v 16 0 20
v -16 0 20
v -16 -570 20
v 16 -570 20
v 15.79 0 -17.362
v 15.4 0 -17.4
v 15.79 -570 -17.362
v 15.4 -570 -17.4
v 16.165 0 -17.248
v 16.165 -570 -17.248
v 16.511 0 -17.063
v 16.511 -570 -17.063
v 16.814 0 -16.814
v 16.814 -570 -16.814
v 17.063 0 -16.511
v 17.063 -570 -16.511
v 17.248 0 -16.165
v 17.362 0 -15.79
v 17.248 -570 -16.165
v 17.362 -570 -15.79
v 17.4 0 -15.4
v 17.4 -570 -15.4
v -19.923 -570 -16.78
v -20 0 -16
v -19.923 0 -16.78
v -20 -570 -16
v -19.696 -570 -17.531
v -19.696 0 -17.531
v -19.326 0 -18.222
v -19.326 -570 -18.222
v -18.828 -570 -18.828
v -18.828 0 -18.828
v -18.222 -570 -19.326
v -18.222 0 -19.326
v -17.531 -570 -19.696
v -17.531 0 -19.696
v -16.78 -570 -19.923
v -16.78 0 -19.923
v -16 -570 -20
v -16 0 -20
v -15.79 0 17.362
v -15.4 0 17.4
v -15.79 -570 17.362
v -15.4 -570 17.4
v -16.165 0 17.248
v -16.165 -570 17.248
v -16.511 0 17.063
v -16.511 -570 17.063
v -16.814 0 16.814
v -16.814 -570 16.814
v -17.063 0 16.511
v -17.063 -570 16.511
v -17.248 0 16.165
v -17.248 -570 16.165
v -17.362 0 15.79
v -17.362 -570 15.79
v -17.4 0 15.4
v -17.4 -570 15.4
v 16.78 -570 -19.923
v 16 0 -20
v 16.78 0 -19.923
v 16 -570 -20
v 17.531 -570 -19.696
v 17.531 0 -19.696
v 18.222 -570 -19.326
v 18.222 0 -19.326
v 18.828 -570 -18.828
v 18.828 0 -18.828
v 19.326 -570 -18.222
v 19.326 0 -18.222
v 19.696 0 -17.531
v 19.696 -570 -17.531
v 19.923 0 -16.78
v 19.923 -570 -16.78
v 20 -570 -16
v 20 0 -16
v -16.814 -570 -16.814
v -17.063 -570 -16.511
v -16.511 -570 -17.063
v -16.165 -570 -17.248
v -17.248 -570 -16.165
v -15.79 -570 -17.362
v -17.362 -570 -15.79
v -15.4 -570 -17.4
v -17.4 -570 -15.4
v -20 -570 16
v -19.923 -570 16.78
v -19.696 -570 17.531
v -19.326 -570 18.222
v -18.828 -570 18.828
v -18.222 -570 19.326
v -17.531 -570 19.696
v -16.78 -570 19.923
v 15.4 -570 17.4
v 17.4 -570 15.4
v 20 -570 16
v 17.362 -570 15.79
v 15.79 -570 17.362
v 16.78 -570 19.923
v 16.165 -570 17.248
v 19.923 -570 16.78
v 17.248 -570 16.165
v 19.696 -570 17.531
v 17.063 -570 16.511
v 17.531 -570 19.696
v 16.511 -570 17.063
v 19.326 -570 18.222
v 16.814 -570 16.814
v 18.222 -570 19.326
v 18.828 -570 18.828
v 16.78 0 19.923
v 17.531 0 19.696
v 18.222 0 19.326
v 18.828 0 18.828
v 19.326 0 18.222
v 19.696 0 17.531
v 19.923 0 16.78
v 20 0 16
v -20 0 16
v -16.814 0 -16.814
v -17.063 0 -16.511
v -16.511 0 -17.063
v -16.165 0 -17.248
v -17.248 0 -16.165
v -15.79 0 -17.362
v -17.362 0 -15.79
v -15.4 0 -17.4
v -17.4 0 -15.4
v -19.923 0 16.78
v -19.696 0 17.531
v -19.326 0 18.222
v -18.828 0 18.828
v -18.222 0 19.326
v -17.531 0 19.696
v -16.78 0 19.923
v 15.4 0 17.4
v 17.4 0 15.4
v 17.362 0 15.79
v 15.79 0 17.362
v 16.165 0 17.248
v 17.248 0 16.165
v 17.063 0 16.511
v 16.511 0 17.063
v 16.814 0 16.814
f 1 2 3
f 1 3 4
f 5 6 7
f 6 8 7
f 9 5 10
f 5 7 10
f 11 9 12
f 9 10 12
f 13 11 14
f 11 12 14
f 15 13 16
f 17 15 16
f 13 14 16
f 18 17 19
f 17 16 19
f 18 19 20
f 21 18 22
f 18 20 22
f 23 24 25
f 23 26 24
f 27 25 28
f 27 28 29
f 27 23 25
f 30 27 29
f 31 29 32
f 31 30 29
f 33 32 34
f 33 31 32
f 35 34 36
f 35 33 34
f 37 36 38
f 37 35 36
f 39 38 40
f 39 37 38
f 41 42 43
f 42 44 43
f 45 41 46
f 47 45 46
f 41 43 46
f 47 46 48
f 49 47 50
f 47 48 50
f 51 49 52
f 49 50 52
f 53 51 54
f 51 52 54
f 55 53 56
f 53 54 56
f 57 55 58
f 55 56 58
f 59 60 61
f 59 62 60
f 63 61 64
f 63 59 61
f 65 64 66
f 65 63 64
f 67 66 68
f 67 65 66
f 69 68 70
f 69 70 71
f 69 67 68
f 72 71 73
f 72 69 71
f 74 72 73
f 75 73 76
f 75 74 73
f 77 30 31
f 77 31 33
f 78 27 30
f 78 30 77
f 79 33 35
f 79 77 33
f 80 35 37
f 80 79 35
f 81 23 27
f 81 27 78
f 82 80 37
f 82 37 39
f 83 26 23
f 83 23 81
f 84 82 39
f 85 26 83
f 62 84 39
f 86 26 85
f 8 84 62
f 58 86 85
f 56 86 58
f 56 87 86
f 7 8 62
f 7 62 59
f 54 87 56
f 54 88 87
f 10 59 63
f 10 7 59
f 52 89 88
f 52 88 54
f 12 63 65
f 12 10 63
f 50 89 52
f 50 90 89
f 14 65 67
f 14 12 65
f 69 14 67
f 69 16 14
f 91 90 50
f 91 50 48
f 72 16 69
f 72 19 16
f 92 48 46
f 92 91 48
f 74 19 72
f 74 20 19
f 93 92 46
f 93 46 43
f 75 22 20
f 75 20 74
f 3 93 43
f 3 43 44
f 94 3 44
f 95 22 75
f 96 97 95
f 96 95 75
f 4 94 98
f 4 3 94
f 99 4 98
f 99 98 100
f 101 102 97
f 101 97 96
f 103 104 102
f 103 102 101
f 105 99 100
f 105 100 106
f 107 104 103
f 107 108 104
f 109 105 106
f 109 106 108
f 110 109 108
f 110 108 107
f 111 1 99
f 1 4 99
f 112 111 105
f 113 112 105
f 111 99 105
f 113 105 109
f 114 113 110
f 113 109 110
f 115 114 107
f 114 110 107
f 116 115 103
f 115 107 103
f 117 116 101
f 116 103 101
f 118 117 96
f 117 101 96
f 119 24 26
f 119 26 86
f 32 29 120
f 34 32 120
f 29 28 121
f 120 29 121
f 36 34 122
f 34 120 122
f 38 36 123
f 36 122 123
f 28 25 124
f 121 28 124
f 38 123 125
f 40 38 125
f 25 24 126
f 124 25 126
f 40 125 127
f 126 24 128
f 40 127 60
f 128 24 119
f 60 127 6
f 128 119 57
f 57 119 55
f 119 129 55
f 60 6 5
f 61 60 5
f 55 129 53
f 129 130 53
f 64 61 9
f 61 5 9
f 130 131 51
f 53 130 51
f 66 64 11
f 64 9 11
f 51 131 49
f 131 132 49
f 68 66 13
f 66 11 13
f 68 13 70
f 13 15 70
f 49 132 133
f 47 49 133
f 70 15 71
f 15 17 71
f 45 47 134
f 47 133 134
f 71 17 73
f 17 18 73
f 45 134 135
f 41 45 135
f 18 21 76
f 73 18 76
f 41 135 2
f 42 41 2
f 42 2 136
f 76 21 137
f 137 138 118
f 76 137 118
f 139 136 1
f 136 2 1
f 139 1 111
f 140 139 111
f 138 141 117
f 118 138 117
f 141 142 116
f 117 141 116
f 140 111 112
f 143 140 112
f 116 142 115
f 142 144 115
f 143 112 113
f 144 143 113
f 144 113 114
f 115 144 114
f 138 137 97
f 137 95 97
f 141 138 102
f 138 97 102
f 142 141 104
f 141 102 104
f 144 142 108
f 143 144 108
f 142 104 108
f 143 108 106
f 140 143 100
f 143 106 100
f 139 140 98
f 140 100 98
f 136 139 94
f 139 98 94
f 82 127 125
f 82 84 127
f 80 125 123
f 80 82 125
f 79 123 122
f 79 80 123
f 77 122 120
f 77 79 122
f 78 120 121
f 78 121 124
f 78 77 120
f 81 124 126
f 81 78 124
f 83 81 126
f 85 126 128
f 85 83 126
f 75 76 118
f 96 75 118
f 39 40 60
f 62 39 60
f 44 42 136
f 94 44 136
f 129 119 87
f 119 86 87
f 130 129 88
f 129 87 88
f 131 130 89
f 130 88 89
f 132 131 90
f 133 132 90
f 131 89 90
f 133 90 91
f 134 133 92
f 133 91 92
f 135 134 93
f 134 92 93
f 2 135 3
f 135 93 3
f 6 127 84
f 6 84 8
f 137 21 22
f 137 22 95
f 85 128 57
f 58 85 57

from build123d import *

# Parameters (mm, degrees)
F0_W     = 40
F0_H     = 40
F0_W_2   = 34.8
F0_H_2   = 34.8
F1_DEPTH = 570
F2_R     = 2
F3_R     = 4


with BuildPart() as f1:
    # F0 (on Front) → F1 (new body)
    with BuildSketch(Plane.XZ):
        Rectangle(F0_W, F0_H)
        Rectangle(F0_W_2, F0_H_2, mode=Mode.SUBTRACT)
    extrude(amount=F1_DEPTH)

    # F2
    f2_edges = [f1.edges().sort_by_distance(p)[0] for p in [
        (-17.4, -285, -17.4),
        (-17.4, -285, 17.4),
        (17.4, -285, 17.4),
        (17.4, -285, -17.4),
    ]]
    fillet(f2_edges, radius=F2_R)

    # F3
    f3_edges = [f1.edges().sort_by_distance(p)[0] for p in [
        (20, -285, 20),
        (-20, -285, 20),
        (20, -285, -20),
        (-20, -285, -20),
    ]]
    fillet(f3_edges, radius=F3_R)


solid = f1.part
